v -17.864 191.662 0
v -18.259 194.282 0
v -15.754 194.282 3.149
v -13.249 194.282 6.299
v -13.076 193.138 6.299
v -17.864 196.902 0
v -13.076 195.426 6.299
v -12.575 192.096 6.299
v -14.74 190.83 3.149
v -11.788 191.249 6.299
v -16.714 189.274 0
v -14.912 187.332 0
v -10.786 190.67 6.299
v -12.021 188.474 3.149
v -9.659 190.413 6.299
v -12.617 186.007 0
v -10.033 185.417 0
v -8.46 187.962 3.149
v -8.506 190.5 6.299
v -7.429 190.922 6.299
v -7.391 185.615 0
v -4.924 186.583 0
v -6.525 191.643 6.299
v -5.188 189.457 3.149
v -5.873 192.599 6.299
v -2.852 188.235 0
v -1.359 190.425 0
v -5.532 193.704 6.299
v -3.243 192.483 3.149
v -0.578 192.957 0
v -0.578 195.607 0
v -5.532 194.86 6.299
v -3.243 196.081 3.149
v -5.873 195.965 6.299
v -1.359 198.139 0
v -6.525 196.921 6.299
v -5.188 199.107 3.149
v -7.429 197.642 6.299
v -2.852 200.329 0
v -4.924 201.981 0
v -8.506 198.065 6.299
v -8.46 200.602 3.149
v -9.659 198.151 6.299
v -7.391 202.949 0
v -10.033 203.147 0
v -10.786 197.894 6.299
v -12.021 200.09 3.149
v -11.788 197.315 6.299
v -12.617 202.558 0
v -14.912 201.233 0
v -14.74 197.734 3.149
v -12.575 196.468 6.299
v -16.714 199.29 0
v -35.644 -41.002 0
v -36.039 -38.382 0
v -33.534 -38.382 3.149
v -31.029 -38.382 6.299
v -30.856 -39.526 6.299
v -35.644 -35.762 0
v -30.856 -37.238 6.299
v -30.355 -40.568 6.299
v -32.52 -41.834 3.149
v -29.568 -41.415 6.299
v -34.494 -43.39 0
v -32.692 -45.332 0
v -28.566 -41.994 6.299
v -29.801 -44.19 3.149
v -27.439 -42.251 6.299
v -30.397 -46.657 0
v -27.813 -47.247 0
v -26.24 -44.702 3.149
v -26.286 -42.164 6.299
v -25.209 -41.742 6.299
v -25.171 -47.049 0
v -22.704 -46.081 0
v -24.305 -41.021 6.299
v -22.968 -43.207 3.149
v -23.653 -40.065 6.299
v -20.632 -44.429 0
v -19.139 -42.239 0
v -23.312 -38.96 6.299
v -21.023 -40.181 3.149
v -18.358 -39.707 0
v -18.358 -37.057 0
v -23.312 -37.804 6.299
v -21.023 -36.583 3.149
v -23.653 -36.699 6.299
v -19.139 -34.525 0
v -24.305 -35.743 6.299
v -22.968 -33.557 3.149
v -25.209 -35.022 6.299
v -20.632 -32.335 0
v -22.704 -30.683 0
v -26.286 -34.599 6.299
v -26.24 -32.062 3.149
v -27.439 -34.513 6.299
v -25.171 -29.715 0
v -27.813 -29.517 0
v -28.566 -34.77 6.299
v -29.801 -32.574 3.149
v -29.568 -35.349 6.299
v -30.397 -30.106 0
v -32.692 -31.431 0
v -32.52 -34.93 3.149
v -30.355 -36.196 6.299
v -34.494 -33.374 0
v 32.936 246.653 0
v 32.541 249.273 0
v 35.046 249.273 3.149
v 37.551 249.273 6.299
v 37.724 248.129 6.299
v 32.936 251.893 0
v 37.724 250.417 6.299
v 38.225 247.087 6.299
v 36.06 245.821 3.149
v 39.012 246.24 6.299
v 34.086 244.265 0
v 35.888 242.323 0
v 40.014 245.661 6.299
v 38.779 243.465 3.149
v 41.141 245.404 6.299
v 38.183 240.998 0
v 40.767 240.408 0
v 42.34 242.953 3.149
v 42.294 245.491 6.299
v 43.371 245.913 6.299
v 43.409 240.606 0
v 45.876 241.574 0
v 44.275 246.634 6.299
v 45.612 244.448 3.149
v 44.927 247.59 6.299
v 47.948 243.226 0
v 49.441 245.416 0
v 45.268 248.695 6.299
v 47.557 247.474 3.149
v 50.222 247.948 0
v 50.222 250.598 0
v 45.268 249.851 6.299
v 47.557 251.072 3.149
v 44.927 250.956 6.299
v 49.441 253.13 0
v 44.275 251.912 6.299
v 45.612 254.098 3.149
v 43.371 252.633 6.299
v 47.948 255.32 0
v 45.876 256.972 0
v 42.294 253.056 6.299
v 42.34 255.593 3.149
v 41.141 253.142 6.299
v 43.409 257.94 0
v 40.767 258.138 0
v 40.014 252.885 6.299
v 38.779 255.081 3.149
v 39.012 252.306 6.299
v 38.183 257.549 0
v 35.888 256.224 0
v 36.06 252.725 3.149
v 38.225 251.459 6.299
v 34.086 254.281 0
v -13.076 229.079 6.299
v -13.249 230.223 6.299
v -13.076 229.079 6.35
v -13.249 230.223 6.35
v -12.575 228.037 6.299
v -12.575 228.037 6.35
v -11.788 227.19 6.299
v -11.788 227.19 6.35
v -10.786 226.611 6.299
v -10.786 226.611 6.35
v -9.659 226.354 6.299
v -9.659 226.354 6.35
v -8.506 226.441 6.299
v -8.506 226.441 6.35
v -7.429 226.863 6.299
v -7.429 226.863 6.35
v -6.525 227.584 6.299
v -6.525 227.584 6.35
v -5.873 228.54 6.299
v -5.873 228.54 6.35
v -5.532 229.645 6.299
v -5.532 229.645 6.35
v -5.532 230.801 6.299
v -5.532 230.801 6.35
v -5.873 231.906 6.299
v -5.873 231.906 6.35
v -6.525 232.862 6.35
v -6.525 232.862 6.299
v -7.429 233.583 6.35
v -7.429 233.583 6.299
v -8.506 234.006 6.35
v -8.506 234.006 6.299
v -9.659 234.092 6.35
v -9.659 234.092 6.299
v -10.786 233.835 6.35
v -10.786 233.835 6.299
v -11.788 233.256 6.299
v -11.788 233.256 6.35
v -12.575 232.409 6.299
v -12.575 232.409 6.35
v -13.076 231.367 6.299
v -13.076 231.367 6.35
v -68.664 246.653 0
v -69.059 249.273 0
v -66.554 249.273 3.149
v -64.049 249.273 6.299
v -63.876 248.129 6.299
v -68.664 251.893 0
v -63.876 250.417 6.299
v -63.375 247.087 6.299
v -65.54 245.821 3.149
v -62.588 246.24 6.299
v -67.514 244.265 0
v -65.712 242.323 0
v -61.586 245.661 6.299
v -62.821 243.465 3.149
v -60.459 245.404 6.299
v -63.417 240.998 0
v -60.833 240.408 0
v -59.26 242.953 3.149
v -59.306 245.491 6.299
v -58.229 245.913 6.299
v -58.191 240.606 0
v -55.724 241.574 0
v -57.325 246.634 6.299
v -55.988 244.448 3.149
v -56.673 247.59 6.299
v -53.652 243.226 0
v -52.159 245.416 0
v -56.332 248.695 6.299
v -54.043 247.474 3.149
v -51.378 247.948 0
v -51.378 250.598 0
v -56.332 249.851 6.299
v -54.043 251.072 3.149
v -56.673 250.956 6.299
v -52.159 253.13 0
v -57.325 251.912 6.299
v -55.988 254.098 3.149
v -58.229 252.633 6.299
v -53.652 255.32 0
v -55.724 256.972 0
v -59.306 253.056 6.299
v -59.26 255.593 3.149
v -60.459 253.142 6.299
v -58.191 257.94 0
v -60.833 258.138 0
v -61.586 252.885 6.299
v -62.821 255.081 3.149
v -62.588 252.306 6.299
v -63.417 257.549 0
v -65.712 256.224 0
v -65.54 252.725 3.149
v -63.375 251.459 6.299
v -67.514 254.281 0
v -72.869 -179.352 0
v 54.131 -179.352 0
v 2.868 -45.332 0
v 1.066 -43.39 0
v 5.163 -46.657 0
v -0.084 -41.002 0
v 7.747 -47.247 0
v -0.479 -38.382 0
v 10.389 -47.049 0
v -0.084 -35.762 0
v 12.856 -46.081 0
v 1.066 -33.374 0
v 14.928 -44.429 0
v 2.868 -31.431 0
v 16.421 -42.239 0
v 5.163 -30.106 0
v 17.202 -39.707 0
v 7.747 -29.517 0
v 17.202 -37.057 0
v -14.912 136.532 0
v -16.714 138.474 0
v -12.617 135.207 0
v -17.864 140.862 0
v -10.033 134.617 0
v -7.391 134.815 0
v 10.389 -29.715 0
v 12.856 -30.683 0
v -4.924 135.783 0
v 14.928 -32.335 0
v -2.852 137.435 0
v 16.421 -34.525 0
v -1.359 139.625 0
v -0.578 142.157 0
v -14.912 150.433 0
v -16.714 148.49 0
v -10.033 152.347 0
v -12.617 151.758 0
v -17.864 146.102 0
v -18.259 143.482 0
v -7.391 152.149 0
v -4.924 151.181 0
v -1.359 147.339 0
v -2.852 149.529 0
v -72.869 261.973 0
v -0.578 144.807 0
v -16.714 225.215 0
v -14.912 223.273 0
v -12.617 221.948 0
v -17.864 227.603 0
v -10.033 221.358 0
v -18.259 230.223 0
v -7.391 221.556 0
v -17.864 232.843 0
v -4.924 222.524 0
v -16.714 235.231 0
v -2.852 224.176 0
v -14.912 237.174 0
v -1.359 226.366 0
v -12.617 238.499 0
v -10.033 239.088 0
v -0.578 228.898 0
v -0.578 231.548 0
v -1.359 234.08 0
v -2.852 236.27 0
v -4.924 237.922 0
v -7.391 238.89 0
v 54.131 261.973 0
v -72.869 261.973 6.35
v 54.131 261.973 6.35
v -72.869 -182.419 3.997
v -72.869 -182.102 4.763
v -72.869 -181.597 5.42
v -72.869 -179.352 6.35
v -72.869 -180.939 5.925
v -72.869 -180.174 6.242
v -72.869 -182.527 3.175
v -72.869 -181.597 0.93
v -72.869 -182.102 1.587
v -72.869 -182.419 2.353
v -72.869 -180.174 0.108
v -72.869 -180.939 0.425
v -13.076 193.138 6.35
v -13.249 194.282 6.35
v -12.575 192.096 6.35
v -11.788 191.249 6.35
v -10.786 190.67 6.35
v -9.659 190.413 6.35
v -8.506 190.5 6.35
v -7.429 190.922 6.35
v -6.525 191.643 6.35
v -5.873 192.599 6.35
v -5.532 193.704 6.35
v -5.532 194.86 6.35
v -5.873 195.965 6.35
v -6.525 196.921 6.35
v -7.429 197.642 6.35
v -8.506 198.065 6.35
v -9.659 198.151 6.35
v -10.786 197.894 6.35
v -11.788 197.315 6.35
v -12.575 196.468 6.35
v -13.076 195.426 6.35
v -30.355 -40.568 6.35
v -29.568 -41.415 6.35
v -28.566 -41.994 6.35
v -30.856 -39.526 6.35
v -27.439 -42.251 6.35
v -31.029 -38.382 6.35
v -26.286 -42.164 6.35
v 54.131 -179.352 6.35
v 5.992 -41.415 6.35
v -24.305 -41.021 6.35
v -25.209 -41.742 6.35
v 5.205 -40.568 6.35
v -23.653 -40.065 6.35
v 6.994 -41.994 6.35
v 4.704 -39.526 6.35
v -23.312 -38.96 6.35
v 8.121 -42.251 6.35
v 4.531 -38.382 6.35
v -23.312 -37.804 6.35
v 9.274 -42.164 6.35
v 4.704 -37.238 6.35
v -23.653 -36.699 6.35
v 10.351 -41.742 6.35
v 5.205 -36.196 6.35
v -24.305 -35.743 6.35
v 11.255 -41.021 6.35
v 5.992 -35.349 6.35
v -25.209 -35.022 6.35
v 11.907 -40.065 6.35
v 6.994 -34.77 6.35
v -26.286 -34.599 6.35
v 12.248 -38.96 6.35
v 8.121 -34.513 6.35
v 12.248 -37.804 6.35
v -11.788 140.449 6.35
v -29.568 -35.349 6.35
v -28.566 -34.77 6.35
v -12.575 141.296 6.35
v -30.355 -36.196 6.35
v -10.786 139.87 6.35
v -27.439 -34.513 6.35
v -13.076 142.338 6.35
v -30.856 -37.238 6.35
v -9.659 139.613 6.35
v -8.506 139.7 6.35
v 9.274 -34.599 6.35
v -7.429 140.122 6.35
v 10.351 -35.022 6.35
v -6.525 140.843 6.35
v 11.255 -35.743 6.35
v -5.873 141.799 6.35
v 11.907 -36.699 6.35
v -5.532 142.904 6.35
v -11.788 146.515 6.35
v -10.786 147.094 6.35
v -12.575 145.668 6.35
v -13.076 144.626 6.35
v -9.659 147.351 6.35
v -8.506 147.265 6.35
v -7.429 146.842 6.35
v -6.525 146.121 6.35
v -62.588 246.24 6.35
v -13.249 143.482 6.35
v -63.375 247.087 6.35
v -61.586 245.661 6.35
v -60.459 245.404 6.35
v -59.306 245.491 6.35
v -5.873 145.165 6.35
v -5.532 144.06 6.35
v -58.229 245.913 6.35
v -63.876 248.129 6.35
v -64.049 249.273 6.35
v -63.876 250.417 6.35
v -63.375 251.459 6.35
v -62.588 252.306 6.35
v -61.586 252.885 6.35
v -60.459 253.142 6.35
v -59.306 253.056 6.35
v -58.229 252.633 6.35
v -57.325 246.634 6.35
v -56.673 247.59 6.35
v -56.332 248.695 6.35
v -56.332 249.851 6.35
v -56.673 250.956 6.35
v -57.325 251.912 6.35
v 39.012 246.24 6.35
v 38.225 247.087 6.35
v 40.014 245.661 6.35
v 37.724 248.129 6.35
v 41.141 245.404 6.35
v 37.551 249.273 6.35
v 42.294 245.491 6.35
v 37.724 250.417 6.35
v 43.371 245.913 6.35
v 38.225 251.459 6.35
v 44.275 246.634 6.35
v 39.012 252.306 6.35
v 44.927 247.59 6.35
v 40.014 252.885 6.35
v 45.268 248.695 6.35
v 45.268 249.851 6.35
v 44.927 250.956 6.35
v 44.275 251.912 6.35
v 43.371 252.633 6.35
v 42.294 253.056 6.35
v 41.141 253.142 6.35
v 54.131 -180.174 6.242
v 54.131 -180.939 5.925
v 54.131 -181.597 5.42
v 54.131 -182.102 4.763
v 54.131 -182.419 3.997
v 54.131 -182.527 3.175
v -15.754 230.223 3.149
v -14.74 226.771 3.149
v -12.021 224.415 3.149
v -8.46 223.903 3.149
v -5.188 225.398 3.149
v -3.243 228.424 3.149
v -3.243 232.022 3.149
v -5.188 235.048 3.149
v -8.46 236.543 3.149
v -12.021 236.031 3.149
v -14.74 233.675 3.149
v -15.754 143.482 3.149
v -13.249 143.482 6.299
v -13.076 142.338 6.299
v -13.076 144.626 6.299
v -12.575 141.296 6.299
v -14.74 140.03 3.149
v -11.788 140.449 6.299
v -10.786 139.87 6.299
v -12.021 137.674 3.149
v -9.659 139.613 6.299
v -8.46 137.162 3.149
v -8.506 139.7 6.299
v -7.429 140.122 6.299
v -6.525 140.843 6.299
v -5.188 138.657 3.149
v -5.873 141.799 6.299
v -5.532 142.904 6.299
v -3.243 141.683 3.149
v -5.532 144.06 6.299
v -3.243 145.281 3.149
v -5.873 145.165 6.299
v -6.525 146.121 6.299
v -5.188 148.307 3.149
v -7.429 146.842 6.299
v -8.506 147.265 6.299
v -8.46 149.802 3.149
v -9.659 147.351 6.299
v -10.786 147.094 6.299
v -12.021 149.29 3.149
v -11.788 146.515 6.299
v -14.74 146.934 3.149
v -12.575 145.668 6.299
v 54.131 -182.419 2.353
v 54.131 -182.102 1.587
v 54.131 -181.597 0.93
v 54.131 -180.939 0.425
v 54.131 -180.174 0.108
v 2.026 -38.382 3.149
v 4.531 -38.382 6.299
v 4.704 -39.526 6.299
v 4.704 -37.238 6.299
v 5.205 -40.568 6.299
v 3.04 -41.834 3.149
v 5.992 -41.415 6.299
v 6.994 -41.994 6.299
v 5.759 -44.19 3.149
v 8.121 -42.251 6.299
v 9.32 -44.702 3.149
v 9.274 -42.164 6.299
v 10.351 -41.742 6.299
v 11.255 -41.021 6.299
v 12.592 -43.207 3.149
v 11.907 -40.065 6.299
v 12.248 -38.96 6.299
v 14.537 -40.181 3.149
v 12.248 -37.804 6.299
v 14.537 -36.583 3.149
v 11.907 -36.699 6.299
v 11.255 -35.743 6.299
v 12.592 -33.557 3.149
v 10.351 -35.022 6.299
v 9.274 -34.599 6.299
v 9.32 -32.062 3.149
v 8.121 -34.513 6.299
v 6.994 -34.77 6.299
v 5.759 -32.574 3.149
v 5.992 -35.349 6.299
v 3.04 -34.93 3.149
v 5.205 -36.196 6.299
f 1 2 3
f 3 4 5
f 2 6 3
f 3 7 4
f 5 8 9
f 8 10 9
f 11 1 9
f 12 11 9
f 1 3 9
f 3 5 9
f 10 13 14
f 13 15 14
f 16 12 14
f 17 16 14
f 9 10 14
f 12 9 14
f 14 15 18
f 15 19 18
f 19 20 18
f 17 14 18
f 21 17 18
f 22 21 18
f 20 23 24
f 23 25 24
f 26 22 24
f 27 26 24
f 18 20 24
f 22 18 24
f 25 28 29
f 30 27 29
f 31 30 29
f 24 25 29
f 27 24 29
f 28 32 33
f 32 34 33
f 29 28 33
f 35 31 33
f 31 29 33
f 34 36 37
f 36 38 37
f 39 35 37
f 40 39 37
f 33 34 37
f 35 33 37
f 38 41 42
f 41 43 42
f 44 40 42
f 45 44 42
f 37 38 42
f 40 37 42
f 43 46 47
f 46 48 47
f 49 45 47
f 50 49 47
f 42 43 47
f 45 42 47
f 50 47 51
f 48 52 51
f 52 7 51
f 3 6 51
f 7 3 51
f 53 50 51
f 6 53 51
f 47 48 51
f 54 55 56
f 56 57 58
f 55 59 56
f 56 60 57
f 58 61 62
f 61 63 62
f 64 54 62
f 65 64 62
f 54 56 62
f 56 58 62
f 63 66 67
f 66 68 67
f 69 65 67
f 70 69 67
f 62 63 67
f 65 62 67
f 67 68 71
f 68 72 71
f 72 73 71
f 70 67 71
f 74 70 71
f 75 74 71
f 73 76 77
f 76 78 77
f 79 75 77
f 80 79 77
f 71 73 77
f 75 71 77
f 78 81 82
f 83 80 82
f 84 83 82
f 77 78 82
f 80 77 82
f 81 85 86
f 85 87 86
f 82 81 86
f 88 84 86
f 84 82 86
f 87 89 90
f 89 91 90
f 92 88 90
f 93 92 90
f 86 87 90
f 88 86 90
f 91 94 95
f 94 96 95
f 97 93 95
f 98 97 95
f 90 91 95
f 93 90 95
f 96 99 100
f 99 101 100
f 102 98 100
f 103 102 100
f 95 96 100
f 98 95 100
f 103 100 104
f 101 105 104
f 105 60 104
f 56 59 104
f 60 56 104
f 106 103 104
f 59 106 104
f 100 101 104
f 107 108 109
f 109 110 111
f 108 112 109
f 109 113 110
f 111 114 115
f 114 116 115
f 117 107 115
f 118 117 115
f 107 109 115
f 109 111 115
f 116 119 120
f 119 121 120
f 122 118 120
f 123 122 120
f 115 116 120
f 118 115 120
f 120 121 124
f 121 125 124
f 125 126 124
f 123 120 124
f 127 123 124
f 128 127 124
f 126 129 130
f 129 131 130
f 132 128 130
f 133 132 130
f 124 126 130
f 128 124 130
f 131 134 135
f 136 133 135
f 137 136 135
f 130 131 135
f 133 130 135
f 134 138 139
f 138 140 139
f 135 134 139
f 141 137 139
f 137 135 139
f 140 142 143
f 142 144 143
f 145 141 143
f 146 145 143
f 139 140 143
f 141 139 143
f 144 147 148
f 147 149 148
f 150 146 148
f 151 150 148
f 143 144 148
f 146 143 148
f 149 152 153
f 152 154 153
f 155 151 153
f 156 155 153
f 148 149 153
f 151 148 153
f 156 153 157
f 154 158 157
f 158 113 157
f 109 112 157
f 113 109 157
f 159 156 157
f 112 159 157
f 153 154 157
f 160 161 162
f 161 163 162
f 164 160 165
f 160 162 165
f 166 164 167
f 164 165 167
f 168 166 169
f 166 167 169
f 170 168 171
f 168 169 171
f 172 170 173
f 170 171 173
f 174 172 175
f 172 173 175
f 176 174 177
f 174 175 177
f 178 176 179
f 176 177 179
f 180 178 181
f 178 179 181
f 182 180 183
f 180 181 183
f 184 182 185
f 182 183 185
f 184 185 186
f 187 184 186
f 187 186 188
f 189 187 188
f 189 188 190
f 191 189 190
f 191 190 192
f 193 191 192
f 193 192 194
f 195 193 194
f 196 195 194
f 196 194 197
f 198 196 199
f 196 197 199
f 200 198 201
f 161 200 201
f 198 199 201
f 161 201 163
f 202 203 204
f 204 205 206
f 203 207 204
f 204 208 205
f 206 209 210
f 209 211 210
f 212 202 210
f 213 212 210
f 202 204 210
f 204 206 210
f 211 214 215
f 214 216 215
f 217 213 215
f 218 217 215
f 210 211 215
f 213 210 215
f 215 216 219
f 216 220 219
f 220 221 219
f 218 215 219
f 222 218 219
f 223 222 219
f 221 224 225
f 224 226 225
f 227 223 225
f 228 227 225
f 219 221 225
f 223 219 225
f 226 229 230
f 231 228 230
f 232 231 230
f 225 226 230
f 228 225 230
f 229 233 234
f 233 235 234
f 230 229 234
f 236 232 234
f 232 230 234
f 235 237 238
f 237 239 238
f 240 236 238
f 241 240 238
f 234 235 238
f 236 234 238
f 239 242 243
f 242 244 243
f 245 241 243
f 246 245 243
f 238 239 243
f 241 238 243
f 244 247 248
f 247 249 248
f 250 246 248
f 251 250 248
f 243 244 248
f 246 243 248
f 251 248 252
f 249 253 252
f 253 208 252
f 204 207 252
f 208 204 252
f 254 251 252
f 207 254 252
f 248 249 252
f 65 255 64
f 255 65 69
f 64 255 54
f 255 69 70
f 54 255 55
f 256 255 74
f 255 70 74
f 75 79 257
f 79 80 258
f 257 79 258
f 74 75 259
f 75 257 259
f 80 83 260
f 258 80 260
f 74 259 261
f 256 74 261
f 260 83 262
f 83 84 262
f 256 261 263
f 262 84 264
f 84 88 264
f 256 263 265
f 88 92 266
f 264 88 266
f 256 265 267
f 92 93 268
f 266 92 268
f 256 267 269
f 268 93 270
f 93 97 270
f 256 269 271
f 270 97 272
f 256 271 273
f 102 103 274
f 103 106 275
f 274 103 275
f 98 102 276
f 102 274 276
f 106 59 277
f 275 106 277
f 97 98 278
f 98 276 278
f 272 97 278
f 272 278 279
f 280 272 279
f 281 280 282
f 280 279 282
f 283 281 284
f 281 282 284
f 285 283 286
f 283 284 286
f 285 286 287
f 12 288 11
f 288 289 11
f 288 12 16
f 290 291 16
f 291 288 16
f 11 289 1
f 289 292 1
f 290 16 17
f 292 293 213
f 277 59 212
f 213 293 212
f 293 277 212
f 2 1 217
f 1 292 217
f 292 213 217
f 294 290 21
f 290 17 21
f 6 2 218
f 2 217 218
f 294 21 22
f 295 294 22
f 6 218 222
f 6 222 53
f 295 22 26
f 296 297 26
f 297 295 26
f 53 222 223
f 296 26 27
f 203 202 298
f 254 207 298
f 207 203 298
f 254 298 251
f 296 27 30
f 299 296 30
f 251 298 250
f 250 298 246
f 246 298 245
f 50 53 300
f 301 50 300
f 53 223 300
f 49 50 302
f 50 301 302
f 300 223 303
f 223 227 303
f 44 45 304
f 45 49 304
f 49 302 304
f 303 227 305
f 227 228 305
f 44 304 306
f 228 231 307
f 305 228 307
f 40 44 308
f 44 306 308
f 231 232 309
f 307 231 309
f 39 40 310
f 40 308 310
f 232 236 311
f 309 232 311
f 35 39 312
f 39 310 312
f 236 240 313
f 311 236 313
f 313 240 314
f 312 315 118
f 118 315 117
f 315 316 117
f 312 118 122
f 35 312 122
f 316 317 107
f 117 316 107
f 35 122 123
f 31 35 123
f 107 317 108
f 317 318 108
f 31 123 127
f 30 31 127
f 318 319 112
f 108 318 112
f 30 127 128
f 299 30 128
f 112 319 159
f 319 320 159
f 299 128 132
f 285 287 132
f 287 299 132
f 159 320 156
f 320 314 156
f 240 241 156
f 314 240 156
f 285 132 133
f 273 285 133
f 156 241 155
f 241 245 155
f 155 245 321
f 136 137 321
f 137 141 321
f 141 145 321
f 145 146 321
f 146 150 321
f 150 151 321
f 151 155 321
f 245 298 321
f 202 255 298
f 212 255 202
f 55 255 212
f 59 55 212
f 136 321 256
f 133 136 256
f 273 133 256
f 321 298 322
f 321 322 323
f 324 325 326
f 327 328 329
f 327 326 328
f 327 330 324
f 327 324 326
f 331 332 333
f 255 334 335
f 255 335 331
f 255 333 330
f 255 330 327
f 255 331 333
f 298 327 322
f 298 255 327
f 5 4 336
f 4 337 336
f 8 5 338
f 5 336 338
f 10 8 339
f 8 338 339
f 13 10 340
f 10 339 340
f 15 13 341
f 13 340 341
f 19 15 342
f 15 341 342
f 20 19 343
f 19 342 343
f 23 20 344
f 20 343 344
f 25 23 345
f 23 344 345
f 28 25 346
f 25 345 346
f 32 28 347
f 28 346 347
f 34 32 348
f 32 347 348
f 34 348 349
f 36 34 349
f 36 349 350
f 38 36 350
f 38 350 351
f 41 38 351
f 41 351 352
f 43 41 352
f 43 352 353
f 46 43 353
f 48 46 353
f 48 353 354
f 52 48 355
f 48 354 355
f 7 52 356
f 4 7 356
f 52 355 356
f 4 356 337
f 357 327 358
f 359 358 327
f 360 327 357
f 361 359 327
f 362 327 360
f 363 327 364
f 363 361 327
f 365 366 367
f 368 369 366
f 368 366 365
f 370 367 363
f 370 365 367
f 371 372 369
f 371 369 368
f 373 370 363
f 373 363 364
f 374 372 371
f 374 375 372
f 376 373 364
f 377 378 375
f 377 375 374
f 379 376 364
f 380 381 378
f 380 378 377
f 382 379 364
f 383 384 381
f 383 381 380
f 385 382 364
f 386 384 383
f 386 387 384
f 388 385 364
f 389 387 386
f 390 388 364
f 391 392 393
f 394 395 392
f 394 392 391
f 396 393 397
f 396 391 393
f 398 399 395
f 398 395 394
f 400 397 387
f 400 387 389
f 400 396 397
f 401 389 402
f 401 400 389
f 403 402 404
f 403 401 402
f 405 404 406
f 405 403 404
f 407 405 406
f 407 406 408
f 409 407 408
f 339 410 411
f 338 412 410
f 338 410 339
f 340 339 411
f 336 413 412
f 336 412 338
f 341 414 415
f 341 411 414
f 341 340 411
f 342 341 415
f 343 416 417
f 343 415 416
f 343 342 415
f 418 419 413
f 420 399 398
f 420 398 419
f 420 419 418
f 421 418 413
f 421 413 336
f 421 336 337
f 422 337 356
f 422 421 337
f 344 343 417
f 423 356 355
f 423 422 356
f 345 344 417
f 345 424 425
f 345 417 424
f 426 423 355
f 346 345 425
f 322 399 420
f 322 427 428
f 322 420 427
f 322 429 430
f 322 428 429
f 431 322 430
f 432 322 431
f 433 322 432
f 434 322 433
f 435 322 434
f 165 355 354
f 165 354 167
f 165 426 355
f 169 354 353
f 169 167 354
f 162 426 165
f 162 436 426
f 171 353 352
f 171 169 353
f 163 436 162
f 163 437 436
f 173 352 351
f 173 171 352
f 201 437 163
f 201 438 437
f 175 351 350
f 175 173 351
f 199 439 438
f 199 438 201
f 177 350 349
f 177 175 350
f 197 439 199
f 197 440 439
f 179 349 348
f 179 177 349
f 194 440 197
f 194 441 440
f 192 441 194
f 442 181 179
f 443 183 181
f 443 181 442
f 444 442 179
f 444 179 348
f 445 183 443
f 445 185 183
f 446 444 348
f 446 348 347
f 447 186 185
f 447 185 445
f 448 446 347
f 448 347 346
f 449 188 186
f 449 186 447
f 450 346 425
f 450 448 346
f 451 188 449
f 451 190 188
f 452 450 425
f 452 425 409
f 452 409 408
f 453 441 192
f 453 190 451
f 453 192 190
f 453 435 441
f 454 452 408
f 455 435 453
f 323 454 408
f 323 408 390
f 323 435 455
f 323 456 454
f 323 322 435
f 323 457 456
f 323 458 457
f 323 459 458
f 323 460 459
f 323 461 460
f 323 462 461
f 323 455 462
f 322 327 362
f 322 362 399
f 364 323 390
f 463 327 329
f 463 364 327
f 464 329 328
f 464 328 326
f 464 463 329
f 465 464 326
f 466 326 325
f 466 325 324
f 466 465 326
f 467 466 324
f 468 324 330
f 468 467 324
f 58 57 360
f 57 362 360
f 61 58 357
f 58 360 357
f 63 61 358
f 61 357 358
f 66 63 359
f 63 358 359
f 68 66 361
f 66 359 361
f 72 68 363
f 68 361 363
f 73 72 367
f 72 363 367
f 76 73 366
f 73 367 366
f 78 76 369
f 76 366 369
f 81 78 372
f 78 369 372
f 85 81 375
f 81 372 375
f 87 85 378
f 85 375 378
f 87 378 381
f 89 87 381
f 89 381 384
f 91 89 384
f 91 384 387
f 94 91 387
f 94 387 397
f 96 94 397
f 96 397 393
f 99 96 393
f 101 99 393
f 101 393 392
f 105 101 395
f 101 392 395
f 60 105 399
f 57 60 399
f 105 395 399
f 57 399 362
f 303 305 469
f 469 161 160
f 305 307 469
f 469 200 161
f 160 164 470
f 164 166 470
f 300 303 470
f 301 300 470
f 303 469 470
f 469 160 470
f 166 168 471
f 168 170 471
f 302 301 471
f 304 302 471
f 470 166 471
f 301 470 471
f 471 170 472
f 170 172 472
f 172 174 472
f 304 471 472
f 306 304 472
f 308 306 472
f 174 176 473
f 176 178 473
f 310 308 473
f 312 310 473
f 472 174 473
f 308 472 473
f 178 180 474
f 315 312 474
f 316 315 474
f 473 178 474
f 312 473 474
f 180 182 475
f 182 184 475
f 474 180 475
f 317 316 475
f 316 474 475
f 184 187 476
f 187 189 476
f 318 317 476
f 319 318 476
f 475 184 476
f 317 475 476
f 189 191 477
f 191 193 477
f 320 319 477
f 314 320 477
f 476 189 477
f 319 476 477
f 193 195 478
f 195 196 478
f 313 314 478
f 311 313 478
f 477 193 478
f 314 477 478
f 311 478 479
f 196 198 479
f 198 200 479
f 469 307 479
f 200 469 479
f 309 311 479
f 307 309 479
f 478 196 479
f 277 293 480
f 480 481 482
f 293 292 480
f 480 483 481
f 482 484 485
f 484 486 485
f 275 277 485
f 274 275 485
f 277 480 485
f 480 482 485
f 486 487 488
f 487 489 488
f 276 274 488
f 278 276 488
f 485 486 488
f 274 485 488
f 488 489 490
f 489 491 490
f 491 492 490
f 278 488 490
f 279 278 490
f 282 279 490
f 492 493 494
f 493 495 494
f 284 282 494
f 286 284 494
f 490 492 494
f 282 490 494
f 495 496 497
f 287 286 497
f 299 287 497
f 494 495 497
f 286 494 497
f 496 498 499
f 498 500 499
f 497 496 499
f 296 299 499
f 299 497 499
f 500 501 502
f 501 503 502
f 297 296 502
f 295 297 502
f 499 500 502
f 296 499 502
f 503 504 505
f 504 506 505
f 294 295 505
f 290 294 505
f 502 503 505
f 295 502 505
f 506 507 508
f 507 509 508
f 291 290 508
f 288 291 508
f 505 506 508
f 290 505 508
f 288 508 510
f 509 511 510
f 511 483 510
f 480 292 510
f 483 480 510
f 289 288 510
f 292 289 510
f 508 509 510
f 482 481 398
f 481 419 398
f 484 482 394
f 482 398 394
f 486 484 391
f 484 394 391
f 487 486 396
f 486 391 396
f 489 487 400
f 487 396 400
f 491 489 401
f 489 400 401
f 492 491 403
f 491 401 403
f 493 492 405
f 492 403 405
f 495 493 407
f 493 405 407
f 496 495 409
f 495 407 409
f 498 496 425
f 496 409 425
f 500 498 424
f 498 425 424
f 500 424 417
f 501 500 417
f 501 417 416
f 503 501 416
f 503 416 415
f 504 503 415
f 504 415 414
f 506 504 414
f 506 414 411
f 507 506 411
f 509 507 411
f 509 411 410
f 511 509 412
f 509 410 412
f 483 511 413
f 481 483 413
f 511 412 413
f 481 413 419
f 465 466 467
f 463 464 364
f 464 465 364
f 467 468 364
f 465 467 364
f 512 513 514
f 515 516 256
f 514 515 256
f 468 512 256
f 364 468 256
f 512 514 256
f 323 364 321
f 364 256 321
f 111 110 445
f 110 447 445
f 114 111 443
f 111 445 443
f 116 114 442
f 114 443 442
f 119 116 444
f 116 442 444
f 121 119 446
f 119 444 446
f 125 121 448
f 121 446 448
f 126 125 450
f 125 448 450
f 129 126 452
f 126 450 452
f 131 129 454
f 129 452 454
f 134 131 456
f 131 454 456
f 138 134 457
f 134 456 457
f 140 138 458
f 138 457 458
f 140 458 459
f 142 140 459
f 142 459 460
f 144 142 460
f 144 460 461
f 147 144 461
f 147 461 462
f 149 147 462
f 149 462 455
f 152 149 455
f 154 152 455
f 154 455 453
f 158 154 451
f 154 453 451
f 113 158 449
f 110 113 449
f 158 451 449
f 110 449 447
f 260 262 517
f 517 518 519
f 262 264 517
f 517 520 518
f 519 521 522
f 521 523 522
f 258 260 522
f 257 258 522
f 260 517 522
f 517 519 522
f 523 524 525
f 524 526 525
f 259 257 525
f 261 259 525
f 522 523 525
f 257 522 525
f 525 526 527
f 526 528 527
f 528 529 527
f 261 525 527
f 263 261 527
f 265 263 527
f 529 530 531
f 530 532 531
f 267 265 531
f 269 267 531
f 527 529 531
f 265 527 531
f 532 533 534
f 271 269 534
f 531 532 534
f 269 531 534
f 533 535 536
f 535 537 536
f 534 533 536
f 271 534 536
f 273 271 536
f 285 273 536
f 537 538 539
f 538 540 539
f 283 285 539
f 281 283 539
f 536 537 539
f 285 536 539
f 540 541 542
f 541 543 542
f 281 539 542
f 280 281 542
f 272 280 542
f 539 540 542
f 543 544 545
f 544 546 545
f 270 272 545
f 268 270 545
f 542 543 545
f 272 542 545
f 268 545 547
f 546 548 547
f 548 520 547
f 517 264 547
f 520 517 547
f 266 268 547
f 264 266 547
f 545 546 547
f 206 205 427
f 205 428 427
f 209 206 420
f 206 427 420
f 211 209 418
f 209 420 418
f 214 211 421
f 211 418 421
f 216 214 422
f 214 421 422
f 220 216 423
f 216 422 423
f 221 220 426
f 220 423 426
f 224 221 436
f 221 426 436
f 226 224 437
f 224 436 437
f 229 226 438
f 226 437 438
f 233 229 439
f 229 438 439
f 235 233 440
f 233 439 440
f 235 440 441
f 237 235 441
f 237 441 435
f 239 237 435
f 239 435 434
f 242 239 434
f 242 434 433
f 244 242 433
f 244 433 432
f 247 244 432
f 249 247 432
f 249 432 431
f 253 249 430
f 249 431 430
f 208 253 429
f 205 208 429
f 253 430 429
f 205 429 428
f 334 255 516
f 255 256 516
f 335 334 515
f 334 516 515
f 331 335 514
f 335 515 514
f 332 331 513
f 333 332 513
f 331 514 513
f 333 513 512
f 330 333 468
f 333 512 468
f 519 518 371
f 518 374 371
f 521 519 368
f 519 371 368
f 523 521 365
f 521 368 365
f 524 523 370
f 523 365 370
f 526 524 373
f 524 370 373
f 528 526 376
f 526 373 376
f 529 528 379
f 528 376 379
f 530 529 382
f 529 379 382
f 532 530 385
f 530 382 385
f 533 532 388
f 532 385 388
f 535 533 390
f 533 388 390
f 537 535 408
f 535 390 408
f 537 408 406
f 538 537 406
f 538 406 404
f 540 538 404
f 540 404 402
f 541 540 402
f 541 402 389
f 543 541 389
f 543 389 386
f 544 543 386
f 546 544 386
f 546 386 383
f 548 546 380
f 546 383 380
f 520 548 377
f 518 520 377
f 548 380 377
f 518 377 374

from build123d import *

# Parameters (mm, degrees)
F0_W           = 127
F0_H           = 444.5
F1_DEPTH       = 6.35
F4_D           = 7.7597
F4_DEPTH       = 9.525
F4_CSINK_D     = 17.78
F4_CSINK_ANGLE = 77
F4_TIP         = 2.3312490727
F5_R           = 3.17499


# Not quite as in the source:
# - a fillet or chamfer is up to 0.001 mm smaller than in the source, because OpenCascade refuses the exact size


with BuildPart() as f1:
    # F0 (on Top) → F1 (new body)
    with BuildSketch(Plane.XY):
        with Locations((-9.3688531779, 39.7230851987)):
            Rectangle(F0_W, F0_H)
    extrude(amount=F1_DEPTH)

    # F4
    with Locations(Plane(origin=(0, 0, 0), x_dir=(1, 0, 0), z_dir=(0, 0, -1))):
        with Locations((41.4311468221, -249.2730851987), (-9.3688531779, -230.2230851987), (-60.1688531779, -249.2730851987), (-9.3688531779, -194.2820851987), (-9.3688531779, -143.4820851987), (8.4111468221, 38.3819148013), (-27.1488531779, 38.3819148013)):
            CounterSinkHole(F4_D / 2, F4_CSINK_D / 2, depth=F4_DEPTH, counter_sink_angle=F4_CSINK_ANGLE)
            with Locations((0, 0, -(F4_DEPTH + F4_TIP / 2))):  # 118° drill point
                Cone(0, F4_D / 2, F4_TIP, mode=Mode.SUBTRACT)

    # F5 (radius 3.175 in the source; OpenCascade refuses exactly that, so slightly less here)
    f5_edges = [f1.edges().sort_by_distance(p)[0] for p in [
        (-9.368853, -182.526915, 6.35),
        (-9.368853, -182.526915, 0),
    ]]
    fillet(f5_edges, radius=F5_R)


solid = f1.part
